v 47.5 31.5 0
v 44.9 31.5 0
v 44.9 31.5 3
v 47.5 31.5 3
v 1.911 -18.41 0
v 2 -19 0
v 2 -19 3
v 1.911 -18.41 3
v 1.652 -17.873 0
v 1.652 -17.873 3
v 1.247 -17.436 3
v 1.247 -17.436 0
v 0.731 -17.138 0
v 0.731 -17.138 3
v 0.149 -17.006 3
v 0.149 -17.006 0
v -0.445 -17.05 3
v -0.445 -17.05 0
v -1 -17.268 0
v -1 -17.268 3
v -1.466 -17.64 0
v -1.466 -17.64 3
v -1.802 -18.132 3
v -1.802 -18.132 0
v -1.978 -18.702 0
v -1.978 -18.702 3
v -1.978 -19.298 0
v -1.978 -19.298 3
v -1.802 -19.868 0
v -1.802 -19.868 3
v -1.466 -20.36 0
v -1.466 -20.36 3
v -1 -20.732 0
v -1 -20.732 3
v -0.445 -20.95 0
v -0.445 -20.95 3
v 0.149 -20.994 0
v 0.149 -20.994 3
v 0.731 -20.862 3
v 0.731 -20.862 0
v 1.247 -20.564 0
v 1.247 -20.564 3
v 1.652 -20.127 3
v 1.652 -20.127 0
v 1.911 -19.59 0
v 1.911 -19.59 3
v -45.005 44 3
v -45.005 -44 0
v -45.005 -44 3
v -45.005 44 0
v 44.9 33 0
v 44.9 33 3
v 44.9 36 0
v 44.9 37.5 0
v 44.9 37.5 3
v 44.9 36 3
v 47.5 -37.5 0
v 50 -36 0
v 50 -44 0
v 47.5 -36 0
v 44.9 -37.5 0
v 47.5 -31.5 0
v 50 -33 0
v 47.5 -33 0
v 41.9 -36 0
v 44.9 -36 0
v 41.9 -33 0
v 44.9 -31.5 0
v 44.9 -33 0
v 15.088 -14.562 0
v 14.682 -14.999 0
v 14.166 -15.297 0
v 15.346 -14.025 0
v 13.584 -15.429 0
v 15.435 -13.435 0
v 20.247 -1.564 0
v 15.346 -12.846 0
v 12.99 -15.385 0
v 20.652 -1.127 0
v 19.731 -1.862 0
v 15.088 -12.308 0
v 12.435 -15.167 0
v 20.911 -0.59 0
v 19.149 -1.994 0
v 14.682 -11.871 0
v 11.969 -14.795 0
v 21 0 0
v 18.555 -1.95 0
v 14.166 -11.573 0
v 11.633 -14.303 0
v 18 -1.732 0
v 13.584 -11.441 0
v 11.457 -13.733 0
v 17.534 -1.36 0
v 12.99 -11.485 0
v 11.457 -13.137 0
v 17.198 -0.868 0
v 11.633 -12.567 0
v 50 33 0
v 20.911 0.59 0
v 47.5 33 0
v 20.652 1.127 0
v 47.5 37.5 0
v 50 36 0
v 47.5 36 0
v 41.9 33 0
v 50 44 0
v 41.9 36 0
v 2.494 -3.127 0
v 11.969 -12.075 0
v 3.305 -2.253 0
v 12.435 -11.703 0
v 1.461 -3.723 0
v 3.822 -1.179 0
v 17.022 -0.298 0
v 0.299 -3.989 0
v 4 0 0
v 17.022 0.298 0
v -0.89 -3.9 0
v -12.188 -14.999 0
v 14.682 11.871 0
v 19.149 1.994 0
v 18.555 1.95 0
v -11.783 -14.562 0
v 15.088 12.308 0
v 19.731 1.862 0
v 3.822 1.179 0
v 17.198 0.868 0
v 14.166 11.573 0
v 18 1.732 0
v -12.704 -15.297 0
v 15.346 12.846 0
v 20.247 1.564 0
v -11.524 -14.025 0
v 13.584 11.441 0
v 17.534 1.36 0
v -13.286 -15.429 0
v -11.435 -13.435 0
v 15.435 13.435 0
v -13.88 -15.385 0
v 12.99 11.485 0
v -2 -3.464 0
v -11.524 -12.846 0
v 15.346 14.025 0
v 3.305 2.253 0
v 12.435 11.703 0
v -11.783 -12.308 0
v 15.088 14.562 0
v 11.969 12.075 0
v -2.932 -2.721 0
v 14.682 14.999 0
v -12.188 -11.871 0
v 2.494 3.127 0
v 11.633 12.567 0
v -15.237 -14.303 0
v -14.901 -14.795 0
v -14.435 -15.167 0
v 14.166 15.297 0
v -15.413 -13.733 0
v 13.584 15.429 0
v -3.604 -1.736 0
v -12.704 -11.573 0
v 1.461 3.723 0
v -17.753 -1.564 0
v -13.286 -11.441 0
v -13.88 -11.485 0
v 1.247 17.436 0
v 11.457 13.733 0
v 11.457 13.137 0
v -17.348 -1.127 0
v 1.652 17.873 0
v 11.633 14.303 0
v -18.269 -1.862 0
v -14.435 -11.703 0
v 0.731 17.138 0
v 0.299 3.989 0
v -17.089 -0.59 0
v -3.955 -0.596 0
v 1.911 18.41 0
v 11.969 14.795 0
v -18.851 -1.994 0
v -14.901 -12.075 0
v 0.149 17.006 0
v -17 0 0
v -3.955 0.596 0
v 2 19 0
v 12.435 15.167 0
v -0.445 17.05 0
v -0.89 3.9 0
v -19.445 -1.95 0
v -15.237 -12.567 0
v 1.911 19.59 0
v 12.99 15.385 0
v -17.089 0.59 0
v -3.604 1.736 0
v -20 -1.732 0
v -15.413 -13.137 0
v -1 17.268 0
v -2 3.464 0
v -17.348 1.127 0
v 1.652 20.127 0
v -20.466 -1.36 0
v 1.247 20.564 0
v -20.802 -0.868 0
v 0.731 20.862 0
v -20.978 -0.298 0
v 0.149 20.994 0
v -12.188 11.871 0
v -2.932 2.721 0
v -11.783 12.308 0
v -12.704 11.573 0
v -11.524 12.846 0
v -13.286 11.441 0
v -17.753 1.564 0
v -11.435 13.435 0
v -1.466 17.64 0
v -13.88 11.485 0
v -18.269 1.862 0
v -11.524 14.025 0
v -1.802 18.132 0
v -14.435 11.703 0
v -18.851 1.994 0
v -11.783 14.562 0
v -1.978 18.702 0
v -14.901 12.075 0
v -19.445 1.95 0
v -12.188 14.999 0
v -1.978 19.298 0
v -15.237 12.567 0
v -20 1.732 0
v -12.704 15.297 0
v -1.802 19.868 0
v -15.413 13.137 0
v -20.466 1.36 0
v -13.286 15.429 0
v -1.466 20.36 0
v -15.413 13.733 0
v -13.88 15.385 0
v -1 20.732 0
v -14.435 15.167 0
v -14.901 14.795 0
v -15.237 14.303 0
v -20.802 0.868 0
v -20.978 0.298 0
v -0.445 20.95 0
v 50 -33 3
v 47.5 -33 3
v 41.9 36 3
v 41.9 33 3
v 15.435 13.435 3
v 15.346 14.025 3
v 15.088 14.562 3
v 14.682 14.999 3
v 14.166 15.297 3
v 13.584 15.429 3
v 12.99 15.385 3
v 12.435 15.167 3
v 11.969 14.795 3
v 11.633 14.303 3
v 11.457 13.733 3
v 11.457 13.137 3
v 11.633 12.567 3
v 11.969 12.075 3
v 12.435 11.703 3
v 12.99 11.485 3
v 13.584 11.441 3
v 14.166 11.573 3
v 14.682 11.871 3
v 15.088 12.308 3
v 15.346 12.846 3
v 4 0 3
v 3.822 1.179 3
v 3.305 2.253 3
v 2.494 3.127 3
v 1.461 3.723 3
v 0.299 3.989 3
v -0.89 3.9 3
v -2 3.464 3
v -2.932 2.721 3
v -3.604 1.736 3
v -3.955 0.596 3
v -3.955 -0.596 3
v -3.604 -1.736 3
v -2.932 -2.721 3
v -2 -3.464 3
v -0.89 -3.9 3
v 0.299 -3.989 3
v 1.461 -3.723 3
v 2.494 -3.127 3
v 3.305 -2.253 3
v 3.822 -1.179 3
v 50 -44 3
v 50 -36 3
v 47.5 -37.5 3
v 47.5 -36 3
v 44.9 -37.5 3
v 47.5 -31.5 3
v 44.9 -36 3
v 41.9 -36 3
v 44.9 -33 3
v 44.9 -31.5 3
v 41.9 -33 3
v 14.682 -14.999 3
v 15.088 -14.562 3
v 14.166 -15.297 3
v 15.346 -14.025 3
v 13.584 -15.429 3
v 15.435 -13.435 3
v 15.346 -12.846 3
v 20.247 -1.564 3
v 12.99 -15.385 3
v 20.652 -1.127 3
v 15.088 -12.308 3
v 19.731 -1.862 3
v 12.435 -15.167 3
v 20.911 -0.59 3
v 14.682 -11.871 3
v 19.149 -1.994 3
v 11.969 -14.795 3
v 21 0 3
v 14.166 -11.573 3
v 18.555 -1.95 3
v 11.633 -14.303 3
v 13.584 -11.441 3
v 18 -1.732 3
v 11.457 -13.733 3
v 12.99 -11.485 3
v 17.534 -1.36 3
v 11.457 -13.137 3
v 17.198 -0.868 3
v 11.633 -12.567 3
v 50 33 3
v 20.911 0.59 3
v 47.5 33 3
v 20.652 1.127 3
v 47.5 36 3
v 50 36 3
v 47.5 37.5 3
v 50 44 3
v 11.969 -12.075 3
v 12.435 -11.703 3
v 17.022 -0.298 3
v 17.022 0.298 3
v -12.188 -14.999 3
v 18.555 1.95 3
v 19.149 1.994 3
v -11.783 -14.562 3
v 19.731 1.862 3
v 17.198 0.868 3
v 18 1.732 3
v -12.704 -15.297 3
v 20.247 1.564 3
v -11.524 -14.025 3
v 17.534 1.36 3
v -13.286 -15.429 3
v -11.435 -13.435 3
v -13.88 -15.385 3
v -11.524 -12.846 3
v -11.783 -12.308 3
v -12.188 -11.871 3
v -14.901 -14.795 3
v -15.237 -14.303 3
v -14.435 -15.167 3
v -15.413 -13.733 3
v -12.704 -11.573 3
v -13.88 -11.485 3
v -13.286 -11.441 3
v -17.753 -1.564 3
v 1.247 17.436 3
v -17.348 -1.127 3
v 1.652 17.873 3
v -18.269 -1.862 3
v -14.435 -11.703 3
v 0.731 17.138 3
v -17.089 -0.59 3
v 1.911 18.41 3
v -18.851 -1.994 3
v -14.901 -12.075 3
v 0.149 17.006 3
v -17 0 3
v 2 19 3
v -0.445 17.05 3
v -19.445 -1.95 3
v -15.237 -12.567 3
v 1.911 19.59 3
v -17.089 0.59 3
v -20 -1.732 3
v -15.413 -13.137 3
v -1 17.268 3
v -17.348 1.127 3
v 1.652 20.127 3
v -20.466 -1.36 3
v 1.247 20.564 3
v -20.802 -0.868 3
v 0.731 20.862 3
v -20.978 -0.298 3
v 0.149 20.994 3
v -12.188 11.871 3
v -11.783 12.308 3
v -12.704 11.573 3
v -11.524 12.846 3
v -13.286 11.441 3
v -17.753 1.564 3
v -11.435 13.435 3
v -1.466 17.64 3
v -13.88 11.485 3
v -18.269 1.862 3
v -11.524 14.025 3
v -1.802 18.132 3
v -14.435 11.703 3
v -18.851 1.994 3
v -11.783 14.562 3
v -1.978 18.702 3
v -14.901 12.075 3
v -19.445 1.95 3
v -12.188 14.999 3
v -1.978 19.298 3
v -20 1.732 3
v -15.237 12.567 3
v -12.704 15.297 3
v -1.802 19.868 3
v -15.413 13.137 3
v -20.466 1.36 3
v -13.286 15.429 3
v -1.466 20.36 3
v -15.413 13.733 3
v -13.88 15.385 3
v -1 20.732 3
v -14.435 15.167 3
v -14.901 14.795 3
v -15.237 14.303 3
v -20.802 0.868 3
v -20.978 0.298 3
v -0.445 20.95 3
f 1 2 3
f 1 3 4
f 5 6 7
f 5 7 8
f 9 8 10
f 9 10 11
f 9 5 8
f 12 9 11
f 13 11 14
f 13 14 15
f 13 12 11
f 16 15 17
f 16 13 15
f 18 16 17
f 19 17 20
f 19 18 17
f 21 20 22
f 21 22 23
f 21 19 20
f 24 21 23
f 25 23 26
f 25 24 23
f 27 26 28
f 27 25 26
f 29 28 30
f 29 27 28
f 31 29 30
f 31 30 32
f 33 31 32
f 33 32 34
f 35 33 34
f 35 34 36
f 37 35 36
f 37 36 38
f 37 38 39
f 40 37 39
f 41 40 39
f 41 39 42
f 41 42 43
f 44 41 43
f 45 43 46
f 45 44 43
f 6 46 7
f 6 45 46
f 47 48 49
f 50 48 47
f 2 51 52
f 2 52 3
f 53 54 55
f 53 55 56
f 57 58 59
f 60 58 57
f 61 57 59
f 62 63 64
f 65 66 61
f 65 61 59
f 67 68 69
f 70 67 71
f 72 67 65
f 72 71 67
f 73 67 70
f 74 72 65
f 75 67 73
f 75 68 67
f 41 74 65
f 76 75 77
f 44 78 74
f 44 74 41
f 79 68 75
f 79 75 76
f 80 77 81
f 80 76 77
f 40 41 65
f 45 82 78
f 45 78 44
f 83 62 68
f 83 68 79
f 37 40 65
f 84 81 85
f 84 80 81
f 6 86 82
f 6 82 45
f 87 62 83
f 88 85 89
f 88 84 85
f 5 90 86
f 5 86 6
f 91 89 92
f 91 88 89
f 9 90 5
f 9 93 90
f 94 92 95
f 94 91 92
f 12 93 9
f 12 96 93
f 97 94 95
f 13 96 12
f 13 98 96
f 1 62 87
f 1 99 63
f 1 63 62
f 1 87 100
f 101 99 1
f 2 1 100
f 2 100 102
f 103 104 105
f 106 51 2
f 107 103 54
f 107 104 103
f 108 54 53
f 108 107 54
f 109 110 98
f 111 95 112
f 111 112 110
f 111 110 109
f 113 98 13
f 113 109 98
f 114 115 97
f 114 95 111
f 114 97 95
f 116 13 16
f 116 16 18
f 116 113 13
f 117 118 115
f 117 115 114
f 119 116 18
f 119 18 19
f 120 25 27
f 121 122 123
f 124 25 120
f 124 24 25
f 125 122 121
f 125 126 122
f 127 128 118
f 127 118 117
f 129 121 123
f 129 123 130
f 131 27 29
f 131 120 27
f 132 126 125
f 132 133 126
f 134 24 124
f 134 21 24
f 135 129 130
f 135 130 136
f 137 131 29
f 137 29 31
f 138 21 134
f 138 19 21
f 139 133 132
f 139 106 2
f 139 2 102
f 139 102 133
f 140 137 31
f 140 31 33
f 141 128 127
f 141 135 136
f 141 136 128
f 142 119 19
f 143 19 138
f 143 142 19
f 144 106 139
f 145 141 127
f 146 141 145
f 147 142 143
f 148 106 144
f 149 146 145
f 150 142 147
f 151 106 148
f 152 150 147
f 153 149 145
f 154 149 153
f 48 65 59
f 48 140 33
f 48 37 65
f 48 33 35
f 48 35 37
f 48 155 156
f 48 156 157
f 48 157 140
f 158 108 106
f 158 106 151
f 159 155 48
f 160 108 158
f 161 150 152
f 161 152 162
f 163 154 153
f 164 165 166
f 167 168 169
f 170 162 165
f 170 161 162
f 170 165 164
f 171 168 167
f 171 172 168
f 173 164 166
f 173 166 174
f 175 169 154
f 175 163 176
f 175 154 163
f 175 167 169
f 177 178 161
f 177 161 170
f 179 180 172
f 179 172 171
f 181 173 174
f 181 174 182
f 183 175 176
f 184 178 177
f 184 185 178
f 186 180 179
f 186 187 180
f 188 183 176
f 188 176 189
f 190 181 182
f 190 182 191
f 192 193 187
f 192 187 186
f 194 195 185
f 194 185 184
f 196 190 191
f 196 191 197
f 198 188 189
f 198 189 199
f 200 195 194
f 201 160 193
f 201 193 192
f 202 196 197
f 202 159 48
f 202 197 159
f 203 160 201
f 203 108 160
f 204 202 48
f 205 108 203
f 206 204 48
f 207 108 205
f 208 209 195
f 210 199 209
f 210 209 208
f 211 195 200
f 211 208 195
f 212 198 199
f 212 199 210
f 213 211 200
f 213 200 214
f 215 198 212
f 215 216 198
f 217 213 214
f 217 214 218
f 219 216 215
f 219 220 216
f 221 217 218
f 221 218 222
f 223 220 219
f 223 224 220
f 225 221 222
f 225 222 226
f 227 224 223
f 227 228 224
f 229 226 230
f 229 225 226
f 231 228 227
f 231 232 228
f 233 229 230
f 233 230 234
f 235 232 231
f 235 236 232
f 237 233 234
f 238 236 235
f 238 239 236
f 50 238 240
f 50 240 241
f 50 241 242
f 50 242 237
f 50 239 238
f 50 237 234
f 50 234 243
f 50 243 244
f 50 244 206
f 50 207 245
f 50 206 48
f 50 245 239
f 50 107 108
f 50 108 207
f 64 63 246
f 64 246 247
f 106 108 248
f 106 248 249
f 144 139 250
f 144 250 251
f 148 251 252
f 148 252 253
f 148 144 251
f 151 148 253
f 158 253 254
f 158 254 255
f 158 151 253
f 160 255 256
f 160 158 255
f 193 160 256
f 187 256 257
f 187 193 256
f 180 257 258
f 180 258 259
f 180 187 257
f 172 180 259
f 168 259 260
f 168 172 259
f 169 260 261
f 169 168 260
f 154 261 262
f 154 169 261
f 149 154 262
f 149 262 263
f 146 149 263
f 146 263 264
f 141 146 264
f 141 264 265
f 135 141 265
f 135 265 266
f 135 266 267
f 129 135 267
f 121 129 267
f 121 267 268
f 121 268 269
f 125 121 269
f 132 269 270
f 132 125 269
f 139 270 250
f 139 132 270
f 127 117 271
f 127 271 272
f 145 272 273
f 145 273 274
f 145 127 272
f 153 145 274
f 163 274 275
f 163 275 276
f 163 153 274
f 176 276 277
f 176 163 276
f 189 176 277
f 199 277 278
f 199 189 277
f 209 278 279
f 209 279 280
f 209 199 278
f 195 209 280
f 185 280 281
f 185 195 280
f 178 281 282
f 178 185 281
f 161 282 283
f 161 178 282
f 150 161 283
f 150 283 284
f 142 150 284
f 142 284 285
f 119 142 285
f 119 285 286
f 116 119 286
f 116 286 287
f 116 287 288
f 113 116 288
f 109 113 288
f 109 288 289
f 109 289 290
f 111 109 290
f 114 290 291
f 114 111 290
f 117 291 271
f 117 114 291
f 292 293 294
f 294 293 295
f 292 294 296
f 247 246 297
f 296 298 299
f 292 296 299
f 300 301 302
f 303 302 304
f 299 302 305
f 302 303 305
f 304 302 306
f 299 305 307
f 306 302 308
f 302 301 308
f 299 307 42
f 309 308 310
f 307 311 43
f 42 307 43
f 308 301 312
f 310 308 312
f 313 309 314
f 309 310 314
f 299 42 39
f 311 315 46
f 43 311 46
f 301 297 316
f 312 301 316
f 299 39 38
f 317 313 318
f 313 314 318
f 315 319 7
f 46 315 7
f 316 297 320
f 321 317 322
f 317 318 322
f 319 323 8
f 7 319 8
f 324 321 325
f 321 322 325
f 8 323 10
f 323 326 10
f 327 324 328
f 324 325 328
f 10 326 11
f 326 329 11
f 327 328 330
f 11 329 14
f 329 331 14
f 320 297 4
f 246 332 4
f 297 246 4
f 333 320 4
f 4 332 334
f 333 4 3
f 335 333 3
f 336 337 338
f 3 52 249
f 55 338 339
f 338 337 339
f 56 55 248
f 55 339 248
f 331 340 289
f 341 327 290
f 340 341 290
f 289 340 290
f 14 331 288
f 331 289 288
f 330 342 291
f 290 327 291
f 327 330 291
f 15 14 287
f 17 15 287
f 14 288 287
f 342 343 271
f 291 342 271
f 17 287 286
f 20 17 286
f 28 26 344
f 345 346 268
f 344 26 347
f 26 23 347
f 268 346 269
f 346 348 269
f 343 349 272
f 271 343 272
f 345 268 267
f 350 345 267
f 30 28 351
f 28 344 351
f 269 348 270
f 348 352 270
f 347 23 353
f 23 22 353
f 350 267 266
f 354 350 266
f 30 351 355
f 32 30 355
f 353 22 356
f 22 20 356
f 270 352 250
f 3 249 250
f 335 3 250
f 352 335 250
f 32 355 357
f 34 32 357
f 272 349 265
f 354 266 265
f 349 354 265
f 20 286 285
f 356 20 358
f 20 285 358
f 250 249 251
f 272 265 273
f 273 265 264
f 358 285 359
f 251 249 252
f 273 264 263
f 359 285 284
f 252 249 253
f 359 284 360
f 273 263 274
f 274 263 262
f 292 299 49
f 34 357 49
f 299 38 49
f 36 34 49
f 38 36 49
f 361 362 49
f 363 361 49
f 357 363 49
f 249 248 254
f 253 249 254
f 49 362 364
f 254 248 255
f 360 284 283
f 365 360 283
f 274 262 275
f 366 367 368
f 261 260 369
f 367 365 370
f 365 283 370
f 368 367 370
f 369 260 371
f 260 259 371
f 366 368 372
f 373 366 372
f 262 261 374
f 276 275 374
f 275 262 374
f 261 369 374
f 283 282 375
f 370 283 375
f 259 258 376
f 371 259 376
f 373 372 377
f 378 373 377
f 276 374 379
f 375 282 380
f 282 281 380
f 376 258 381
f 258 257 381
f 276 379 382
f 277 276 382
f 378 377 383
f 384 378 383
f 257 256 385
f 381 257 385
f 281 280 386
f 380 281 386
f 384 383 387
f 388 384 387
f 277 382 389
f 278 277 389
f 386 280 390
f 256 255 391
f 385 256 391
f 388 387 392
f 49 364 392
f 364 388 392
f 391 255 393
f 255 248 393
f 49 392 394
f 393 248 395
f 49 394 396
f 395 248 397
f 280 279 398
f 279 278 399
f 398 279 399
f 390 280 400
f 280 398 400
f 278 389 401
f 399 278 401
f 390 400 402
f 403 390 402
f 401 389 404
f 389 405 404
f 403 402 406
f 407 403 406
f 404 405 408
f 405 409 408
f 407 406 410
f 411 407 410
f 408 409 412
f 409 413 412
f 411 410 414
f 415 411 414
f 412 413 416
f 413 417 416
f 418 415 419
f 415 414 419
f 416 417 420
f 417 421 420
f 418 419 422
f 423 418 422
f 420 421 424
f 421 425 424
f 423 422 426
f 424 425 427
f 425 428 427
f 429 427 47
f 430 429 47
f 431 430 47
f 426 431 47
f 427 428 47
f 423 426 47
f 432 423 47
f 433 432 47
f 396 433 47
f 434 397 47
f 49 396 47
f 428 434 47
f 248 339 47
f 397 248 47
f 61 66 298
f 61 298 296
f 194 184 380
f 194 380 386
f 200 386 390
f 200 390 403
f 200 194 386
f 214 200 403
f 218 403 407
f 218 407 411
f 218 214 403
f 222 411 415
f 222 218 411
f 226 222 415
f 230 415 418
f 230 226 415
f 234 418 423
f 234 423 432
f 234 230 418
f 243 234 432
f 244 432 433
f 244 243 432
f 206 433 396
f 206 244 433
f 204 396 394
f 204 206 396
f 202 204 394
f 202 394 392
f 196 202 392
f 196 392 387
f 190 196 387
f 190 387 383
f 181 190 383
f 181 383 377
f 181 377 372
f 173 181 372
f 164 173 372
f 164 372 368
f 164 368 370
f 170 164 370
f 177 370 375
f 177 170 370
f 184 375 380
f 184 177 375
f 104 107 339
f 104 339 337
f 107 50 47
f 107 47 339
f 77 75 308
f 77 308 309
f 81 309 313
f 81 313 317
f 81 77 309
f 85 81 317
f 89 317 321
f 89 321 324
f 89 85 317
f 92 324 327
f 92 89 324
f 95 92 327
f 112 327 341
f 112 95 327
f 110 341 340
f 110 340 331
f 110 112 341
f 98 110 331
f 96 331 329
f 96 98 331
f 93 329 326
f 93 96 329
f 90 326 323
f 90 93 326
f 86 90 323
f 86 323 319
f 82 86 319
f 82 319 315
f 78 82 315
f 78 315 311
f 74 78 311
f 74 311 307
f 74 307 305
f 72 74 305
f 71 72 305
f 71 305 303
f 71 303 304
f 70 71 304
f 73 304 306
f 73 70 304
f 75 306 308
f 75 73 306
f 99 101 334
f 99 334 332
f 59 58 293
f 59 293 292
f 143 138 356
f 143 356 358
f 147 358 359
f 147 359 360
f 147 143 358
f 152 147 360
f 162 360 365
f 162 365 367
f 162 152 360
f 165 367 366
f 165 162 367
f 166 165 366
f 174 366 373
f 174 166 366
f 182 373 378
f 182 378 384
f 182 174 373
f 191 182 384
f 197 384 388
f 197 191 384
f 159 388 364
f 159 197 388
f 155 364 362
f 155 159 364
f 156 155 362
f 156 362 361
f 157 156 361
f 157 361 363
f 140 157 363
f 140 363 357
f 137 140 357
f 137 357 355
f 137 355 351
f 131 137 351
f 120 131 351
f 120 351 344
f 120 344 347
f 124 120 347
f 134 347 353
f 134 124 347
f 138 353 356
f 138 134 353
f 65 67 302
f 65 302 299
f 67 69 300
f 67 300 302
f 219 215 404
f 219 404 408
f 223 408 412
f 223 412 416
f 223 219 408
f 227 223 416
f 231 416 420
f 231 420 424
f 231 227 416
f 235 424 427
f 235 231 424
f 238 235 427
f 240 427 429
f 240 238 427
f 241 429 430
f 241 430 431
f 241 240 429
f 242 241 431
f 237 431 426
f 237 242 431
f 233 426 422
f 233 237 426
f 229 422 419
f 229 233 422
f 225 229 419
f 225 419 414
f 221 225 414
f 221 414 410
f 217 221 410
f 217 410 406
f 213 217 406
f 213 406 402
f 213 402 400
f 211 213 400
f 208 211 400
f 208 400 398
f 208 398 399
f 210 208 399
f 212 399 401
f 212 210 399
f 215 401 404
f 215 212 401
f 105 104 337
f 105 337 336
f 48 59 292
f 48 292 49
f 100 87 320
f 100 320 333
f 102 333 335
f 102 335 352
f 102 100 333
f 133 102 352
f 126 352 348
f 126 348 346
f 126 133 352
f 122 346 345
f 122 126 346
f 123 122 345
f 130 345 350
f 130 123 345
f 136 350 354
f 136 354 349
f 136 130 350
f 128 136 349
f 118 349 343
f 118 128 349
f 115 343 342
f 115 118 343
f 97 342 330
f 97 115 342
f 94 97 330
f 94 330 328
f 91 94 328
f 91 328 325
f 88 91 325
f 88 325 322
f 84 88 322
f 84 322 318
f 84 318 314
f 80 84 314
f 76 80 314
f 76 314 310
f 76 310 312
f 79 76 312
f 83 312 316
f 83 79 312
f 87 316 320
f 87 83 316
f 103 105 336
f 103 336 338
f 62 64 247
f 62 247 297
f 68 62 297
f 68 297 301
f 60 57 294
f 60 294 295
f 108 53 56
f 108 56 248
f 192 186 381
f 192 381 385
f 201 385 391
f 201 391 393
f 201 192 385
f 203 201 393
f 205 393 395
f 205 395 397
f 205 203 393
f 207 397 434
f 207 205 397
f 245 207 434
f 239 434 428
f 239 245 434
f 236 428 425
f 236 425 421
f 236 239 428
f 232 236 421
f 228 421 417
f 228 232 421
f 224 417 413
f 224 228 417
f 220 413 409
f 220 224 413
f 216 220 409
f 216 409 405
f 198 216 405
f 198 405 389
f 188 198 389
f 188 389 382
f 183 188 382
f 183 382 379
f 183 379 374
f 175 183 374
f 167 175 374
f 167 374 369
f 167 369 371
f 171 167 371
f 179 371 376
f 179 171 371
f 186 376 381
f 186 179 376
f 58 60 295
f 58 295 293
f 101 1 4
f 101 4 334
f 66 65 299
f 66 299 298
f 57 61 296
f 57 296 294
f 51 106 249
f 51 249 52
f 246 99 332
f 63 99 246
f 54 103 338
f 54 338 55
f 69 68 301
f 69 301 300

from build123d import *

# Parameters (mm, degrees)
SKETCH_1_R      = 4
SKETCH_1_R_2    = 2
EXTRUDE_1_DEPTH = 3


with BuildPart() as part:
    # 草图1 → 凸台-拉伸1 (new body)
    with BuildSketch(Plane.XY):
        Polygon((50, 44), (50, 36), (47.5, 36), (47.5, 37.5), (44.9, 37.5), (44.9, 36), (41.9, 36), (41.9, 33), (44.9, 33), (44.9, 31.5), (47.5, 31.5), (47.5, 33), (50, 33), (50, -33), (47.5, -33), (47.5, -31.5), (44.9, -31.5), (44.9, -33), (41.9, -33), (41.9, -36), (44.9, -36), (44.9, -37.5), (47.5, -37.5), (47.5, -36), (50, -36), (50, -44), (-45.00536, -44), (-45.00536, 44), align=None)
        Circle(SKETCH_1_R, mode=Mode.SUBTRACT)
        with Locations((0, -19)):
            Circle(SKETCH_1_R_2, mode=Mode.SUBTRACT)
        with Locations((-13.435028843, -13.435028843)):
            Circle(SKETCH_1_R_2, mode=Mode.SUBTRACT)
        with Locations((-19, 0)):
            Circle(SKETCH_1_R_2, mode=Mode.SUBTRACT)
        with Locations((-13.435028843, 13.435028843)):
            Circle(SKETCH_1_R_2, mode=Mode.SUBTRACT)
        with Locations((0, 19)):
            Circle(SKETCH_1_R_2, mode=Mode.SUBTRACT)
        with Locations((13.435028843, 13.435028843)):
            Circle(SKETCH_1_R_2, mode=Mode.SUBTRACT)
        with Locations((19, 0)):
            Circle(SKETCH_1_R_2, mode=Mode.SUBTRACT)
        with Locations((13.435028843, -13.435028843)):
            Circle(SKETCH_1_R_2, mode=Mode.SUBTRACT)
    extrude(amount=EXTRUDE_1_DEPTH)


solid = part.part
